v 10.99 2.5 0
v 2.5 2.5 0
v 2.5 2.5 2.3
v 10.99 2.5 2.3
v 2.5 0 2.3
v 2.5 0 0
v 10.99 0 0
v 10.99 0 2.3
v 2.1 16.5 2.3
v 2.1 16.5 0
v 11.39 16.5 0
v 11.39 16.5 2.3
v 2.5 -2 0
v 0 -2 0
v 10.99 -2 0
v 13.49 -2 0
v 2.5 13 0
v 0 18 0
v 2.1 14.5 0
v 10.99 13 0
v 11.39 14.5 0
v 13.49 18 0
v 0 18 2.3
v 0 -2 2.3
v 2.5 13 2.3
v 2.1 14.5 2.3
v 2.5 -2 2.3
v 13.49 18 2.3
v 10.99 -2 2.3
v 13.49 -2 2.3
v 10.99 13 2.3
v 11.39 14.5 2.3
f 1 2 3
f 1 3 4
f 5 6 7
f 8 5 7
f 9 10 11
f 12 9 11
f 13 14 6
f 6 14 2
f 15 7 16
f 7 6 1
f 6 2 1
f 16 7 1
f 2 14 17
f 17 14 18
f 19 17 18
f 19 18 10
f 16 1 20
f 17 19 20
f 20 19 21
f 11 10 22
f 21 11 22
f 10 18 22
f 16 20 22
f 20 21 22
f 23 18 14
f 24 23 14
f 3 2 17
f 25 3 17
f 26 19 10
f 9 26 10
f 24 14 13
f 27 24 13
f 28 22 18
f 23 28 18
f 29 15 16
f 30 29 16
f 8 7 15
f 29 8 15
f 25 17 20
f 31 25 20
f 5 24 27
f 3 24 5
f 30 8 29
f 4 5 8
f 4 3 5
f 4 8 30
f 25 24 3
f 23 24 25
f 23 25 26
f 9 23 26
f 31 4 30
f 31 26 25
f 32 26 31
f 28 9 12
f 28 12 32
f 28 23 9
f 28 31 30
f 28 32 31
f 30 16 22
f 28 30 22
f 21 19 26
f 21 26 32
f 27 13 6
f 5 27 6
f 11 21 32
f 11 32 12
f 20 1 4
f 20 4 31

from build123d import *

# Parameters (mm, degrees)
SKETCH1_W           = 8.49
SKETCH1_H           = 10.5
SKETCH1_W_2         = 9.29
SKETCH1_H_2         = 2
BOSS_EXTRUDE1_DEPTH = 2.3


with BuildPart() as part:
    # Sketch1 → Boss-Extrude1 (new body)
    with BuildSketch(Plane.XY):
        Polygon((0, 0), (0, -2), (2.5, -2), (2.5, 0), (10.99, 0), (10.99, -2), (13.49, -2), (13.49, 0), (13.49, 18), (0, 18), align=None)
        with Locations((6.745, 7.75)):
            Rectangle(SKETCH1_W, SKETCH1_H, mode=Mode.SUBTRACT)
        with Locations((6.745, 15.5)):
            Rectangle(SKETCH1_W_2, SKETCH1_H_2, mode=Mode.SUBTRACT)
    extrude(amount=BOSS_EXTRUDE1_DEPTH)


solid = part.part
